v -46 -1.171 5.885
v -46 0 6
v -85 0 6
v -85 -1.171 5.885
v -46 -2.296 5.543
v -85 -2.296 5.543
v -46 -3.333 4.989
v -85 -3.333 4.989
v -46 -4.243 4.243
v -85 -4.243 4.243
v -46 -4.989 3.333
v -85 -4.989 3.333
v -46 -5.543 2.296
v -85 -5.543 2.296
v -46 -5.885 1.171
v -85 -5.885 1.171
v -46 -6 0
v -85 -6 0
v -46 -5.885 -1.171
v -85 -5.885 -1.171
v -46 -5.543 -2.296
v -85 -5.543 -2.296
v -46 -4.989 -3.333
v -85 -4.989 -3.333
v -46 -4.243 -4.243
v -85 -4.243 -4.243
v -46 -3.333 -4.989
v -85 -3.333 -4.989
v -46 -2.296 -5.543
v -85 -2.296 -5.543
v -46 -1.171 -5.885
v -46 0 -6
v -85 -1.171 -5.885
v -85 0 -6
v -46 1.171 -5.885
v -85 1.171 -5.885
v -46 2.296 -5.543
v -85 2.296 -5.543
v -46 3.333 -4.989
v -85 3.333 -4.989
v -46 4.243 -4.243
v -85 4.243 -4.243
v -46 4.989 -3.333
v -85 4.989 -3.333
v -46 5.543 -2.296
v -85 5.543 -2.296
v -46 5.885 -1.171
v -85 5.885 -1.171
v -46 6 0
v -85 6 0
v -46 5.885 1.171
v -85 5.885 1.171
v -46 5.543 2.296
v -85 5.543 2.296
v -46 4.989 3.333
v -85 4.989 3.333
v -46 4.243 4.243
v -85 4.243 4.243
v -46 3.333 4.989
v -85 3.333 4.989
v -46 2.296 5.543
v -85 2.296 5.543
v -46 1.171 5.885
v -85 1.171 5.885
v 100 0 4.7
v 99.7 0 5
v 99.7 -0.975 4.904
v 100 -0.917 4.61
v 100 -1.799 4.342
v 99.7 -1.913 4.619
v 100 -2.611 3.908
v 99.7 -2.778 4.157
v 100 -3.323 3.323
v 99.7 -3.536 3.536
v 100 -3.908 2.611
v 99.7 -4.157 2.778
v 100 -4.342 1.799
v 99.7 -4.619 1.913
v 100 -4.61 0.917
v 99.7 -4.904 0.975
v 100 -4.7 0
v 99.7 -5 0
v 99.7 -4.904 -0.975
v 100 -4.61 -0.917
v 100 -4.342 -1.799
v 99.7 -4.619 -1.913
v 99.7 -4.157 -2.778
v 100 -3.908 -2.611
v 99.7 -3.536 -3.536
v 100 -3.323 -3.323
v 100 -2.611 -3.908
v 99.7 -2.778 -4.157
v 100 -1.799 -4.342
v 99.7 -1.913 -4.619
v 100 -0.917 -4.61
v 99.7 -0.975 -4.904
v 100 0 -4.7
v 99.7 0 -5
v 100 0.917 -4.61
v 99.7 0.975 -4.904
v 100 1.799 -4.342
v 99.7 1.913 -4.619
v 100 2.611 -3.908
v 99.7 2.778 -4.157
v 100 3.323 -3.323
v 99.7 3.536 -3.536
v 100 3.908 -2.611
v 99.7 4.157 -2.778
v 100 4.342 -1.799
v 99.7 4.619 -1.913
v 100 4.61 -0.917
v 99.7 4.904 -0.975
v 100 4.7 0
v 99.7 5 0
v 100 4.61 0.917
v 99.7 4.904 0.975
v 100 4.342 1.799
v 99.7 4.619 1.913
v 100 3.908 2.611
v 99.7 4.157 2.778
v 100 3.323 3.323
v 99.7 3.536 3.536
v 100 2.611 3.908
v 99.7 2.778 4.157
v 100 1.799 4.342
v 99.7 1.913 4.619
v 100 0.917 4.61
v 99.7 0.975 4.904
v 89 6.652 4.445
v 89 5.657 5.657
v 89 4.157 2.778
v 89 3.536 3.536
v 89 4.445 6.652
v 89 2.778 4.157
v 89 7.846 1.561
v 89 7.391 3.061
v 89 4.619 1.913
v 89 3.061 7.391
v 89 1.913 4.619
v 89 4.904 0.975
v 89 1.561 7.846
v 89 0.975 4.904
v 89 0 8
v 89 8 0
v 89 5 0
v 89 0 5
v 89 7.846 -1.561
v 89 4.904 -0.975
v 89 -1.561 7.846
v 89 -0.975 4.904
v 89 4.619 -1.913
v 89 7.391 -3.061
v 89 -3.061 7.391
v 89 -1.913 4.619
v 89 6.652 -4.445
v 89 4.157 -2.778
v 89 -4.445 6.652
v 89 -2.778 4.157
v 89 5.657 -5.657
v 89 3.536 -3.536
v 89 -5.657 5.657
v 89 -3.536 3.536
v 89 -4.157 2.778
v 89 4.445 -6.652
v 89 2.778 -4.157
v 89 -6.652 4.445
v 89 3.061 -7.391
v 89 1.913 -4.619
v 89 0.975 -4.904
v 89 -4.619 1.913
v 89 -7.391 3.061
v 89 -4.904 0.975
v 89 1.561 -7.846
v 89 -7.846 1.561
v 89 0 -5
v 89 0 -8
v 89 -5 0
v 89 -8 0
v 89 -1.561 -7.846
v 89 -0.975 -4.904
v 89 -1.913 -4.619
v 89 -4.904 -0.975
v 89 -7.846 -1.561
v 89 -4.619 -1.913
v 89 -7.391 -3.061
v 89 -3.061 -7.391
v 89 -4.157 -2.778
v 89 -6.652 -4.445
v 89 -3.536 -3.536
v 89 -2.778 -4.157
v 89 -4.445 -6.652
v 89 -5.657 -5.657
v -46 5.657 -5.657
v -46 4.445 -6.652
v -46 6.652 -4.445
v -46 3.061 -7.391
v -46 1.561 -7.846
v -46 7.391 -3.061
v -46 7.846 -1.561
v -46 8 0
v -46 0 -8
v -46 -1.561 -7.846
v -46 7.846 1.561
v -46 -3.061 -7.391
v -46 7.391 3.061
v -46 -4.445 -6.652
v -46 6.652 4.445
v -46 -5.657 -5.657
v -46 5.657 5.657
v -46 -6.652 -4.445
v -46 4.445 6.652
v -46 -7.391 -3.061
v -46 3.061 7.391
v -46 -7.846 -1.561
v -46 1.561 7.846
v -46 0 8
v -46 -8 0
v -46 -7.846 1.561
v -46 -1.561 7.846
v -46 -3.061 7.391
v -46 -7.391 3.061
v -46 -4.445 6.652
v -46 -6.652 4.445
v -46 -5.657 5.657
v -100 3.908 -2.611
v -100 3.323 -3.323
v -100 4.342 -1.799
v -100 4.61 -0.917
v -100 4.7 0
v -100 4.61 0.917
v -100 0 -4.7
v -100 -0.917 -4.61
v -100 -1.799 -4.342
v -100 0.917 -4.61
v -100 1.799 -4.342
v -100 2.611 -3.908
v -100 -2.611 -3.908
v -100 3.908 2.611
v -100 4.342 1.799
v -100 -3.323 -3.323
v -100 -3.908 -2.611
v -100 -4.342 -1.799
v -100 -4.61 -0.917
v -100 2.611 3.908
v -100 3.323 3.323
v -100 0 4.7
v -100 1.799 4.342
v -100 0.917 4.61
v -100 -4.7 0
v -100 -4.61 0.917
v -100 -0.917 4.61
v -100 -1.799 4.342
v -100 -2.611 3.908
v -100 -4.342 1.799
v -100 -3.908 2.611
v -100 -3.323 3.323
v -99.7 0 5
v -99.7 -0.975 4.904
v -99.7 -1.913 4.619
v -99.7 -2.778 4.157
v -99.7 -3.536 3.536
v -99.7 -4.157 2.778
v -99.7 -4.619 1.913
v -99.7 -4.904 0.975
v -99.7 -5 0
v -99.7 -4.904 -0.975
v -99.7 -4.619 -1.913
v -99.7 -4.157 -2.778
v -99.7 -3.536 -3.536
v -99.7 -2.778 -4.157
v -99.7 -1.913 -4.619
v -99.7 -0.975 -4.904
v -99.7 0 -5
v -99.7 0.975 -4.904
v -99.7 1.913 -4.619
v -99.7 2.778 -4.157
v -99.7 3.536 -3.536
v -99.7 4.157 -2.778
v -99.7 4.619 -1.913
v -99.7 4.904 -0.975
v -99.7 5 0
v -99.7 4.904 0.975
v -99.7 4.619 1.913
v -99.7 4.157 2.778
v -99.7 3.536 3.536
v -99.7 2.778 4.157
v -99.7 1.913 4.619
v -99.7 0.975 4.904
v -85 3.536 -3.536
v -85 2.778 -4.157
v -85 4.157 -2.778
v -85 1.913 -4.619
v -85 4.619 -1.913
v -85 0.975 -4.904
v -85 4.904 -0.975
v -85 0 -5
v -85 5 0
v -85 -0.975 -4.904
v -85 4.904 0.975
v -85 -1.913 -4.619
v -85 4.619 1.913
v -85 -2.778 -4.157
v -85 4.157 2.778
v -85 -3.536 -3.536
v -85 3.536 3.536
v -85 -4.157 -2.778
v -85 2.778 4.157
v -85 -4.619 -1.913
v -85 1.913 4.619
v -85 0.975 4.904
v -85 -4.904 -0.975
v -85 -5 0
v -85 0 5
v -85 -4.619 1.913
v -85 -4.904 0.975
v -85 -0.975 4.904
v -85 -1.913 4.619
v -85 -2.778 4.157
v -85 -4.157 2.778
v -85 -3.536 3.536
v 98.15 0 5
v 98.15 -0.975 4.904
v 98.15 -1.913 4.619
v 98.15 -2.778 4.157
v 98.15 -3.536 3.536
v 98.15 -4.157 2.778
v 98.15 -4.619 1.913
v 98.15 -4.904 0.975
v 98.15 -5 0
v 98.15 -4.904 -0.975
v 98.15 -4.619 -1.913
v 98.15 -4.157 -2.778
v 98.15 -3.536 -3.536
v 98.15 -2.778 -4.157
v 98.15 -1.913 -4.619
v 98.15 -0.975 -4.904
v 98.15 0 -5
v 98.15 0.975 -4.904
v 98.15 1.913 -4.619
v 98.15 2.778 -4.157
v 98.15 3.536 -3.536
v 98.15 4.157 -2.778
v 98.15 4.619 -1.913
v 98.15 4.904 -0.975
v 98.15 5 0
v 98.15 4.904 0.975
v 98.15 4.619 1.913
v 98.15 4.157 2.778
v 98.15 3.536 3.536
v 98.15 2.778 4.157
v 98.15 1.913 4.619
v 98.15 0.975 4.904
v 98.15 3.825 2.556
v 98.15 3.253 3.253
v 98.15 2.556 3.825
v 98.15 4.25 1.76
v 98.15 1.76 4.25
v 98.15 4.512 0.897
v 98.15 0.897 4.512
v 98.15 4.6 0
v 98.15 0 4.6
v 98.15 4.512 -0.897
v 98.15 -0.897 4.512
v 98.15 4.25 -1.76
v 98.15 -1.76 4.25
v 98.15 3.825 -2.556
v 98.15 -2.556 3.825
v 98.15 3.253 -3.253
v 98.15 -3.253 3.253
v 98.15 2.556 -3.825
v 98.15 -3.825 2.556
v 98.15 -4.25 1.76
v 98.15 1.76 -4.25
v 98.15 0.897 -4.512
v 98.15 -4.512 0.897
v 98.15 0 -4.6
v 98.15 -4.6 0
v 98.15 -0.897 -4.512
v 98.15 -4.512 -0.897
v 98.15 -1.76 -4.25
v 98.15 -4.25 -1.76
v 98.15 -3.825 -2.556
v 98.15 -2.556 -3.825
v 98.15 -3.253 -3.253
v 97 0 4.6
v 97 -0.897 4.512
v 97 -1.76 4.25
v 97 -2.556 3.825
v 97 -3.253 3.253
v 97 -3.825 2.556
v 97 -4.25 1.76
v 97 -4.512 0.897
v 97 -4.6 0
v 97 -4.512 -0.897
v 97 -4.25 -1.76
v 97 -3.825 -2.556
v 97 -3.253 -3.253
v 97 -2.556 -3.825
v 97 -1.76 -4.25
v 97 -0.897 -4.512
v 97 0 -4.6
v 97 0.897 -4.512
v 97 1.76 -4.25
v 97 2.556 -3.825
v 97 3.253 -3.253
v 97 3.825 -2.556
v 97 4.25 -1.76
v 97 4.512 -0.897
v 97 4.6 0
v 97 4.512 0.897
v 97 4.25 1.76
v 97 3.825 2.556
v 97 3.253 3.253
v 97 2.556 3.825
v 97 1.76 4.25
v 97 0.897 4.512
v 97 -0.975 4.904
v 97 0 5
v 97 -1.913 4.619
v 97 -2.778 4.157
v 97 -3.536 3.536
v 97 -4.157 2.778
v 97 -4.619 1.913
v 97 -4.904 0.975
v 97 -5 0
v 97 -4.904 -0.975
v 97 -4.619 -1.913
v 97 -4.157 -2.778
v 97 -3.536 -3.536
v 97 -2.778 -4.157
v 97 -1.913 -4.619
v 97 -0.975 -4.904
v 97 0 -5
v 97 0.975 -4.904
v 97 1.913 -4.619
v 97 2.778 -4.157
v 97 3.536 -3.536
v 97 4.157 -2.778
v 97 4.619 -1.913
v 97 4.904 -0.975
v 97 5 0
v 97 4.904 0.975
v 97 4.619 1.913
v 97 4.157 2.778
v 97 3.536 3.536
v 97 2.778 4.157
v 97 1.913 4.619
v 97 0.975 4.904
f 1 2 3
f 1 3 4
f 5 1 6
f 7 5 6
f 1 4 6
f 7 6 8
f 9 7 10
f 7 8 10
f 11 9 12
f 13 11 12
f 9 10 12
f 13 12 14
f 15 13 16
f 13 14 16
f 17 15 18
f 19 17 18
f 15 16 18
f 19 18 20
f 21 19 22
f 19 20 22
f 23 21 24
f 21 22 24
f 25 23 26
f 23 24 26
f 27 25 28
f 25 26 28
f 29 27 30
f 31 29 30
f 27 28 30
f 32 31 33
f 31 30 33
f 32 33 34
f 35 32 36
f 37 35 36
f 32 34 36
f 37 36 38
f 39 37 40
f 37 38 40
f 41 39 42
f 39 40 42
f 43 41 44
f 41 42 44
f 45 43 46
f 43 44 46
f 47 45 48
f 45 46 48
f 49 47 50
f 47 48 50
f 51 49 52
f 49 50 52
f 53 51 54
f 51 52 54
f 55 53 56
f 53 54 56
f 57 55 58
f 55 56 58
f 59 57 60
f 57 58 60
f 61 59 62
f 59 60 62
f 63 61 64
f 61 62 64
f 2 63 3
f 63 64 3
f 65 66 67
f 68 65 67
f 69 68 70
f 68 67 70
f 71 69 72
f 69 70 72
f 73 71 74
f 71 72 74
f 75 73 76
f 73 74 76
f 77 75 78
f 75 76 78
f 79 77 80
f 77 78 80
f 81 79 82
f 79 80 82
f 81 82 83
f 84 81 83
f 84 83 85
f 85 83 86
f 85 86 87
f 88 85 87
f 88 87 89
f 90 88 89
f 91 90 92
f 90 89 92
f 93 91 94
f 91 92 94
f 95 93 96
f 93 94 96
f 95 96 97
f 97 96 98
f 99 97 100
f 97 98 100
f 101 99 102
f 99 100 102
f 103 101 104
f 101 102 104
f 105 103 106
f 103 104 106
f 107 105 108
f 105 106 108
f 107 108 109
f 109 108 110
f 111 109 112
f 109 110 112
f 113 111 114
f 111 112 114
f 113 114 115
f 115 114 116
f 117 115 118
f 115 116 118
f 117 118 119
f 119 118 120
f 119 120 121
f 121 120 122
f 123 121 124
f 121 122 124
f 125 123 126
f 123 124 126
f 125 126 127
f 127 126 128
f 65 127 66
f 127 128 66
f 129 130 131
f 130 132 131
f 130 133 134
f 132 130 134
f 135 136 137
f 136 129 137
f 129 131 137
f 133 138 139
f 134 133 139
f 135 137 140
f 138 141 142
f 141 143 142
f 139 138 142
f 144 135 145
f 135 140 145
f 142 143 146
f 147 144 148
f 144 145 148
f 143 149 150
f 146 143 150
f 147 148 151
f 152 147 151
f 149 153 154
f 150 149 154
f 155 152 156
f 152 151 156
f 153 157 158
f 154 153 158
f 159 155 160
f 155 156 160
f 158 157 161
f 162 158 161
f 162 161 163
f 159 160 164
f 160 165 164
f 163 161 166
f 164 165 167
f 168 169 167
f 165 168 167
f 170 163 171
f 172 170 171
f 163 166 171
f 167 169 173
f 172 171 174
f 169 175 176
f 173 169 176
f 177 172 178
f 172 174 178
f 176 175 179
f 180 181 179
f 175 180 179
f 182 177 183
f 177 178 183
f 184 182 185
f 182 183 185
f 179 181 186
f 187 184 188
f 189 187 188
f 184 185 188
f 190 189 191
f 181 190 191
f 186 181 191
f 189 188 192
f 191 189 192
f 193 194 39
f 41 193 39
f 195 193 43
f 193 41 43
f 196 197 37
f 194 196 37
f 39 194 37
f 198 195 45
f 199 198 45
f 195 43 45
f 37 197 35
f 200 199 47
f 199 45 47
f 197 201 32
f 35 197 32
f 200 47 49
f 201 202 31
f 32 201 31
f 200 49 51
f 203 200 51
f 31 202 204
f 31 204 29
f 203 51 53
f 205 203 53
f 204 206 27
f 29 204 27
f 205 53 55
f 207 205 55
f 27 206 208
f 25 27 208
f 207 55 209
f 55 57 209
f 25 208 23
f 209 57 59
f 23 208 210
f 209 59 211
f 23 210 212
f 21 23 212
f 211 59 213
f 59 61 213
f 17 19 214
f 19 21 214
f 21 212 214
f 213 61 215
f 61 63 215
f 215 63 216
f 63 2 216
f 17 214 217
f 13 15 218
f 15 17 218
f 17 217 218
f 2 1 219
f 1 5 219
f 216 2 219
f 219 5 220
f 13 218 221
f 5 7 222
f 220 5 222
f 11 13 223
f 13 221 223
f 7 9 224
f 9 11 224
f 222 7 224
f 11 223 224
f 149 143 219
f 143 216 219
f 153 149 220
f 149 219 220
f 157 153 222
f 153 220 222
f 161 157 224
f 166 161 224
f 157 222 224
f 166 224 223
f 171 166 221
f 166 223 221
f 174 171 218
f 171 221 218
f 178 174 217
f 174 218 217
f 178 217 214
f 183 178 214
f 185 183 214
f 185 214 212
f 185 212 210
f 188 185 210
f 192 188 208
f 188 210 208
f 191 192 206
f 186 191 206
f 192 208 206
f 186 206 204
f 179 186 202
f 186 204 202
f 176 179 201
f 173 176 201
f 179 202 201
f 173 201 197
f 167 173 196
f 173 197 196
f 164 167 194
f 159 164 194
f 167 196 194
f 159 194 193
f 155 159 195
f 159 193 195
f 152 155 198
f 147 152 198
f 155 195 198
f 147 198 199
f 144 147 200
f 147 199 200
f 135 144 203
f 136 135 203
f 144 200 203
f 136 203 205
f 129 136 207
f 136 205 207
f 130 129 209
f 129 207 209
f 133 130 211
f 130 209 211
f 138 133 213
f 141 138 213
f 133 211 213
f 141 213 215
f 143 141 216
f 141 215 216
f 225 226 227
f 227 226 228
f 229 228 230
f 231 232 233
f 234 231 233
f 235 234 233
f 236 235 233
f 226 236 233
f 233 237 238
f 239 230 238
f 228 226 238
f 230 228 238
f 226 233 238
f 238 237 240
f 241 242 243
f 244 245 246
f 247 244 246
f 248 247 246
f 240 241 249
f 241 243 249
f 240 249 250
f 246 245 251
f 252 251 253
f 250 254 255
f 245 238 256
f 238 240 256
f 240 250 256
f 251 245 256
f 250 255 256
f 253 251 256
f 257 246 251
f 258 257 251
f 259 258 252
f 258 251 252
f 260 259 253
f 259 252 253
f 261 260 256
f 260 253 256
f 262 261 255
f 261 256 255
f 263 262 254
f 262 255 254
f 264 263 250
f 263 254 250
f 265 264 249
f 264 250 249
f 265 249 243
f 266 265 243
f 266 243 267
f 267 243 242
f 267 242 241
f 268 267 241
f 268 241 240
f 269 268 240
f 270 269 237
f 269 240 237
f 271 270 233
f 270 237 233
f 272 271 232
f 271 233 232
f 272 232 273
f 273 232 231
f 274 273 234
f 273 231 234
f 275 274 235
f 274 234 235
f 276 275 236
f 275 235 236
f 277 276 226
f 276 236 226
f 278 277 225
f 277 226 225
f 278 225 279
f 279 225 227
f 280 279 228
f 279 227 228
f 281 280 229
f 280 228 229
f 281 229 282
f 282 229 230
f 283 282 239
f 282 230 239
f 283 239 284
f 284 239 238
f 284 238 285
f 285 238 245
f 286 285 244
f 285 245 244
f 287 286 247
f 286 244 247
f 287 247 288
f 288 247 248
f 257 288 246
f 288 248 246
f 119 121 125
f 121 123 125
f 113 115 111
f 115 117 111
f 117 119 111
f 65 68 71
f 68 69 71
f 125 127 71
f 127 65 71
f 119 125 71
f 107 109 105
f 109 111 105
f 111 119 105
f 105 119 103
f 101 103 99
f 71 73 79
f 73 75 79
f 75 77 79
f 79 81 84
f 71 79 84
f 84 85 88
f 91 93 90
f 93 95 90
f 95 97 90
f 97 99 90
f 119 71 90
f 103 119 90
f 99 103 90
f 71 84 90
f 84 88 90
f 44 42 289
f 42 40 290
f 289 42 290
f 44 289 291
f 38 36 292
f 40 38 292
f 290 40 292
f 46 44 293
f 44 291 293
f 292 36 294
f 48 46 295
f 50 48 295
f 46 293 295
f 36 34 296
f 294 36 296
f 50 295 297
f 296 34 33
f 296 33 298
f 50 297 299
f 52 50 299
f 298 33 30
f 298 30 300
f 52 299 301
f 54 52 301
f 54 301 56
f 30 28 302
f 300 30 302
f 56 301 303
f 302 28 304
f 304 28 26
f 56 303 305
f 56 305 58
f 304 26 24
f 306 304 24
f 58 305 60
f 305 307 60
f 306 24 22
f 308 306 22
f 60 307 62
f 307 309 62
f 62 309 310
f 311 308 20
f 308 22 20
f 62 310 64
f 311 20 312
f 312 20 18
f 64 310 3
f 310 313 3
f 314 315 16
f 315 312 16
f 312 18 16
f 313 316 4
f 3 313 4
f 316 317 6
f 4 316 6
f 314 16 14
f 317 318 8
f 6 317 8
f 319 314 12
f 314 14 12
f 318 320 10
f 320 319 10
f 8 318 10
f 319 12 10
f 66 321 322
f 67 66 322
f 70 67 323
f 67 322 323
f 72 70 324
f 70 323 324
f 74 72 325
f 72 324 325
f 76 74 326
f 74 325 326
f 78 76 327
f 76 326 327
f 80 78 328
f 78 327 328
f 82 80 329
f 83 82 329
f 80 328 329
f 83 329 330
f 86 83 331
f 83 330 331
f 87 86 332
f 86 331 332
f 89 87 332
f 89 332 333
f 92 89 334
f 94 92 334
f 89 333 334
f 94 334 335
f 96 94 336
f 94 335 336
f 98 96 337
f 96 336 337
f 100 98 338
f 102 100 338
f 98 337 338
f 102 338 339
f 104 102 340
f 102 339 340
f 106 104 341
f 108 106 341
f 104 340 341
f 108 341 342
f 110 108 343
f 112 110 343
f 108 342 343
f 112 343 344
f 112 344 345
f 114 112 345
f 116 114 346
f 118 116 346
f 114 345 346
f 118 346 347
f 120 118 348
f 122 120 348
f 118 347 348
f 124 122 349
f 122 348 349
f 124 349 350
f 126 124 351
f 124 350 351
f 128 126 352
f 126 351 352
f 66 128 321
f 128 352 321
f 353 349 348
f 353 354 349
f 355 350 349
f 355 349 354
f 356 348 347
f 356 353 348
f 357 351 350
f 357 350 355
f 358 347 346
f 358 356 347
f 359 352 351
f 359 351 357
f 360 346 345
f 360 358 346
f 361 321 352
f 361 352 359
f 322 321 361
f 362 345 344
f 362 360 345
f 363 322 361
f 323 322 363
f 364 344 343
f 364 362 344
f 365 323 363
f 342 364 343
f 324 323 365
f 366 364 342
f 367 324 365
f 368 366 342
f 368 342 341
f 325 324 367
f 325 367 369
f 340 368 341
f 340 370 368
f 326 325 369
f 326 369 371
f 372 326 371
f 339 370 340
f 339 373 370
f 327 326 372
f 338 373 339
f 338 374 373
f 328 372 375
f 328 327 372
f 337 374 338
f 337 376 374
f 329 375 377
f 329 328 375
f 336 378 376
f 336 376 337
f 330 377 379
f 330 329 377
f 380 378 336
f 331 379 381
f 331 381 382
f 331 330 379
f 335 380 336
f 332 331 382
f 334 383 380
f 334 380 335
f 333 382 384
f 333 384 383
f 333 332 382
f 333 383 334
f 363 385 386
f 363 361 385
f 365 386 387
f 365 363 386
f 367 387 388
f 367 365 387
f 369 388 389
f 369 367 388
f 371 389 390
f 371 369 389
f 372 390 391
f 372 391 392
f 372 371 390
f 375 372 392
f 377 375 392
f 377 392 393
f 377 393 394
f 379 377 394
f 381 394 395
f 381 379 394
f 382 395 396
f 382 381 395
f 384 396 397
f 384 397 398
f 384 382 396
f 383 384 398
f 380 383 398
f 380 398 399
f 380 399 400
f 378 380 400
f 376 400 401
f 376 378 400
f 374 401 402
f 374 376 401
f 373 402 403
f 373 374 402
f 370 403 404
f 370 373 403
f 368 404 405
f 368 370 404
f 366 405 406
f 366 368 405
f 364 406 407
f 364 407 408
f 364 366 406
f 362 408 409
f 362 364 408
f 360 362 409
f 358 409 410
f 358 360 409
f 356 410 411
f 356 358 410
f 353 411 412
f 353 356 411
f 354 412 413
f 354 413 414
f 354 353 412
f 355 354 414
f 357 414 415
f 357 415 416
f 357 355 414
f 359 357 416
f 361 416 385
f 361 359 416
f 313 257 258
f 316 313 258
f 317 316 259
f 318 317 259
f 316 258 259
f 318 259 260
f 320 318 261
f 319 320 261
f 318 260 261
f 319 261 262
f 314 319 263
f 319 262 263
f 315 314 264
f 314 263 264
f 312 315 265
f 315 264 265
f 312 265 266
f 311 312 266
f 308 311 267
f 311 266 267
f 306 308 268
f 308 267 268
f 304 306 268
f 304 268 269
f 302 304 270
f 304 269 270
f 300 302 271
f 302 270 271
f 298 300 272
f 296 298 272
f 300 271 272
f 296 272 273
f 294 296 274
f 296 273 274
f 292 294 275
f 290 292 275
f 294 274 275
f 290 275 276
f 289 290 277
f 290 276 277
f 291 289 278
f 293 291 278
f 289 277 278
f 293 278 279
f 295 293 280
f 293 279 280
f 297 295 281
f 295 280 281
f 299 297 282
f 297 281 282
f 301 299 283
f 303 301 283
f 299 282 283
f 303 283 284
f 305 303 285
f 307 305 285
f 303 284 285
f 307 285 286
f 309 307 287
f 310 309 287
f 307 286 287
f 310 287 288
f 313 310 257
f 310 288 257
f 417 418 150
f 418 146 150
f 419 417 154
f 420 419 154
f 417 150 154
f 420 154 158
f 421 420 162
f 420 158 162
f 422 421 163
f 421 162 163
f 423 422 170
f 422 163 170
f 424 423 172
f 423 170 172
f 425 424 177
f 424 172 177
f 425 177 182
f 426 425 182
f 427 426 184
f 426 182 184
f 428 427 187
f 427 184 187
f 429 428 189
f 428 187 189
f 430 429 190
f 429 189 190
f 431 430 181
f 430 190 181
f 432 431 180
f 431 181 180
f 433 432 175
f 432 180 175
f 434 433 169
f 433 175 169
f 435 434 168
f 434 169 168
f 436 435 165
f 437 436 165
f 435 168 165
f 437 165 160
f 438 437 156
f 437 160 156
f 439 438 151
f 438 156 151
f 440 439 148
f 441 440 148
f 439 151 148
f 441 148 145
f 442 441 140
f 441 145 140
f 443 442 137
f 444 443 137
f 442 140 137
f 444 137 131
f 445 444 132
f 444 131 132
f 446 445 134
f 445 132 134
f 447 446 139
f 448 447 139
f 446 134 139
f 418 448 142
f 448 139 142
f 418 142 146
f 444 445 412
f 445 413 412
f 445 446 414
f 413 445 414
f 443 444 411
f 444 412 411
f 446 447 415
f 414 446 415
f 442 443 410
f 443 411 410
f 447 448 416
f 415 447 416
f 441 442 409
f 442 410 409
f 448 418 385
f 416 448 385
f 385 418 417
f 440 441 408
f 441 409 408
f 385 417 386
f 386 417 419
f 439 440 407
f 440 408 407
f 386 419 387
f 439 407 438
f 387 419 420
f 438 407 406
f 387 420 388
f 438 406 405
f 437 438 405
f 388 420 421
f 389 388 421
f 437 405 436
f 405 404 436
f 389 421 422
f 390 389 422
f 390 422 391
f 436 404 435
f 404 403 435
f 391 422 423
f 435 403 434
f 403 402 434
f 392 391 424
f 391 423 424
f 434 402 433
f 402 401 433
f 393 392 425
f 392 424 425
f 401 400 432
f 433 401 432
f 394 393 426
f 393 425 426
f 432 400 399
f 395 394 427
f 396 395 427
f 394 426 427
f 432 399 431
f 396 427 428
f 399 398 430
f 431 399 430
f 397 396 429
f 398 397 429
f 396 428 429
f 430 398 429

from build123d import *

# Parameters (mm, degrees)
SKETCH_2_W     = 1.15
SKETCH_2_H     = 0.4
CHAMFER_1_SIZE = 0.3


with BuildPart() as part:
    # Эскиз1 → Повернуть1 (revolve)
    with BuildSketch(Plane.XY):
        Polygon((-100, 0), (100, 0), (100, 5), (89, 5), (89, 8), (-46, 8), (-46, 6), (-85, 6), (-85, 5), (-100, 5), align=None)
    revolve(axis=Axis((-100, 0, 0), (1, 0, 0)))

    # Эскиз2 → Вырез-Повернуть1 (revolve, cut)
    with BuildSketch(Plane.XY):
        with Locations((97.575, 4.8)):
            Rectangle(SKETCH_2_W, SKETCH_2_H)
    revolve(axis=Axis((89, 0, 0), (1, 0, 0)), mode=Mode.SUBTRACT)

    # Фаска1
    chamfer_1_edges = [part.edges().sort_by_distance(p)[0] for p in [
        (-100, -5, 0),
        (100, -5, 0),
    ]]
    chamfer(chamfer_1_edges, length=CHAMFER_1_SIZE)


solid = part.part
